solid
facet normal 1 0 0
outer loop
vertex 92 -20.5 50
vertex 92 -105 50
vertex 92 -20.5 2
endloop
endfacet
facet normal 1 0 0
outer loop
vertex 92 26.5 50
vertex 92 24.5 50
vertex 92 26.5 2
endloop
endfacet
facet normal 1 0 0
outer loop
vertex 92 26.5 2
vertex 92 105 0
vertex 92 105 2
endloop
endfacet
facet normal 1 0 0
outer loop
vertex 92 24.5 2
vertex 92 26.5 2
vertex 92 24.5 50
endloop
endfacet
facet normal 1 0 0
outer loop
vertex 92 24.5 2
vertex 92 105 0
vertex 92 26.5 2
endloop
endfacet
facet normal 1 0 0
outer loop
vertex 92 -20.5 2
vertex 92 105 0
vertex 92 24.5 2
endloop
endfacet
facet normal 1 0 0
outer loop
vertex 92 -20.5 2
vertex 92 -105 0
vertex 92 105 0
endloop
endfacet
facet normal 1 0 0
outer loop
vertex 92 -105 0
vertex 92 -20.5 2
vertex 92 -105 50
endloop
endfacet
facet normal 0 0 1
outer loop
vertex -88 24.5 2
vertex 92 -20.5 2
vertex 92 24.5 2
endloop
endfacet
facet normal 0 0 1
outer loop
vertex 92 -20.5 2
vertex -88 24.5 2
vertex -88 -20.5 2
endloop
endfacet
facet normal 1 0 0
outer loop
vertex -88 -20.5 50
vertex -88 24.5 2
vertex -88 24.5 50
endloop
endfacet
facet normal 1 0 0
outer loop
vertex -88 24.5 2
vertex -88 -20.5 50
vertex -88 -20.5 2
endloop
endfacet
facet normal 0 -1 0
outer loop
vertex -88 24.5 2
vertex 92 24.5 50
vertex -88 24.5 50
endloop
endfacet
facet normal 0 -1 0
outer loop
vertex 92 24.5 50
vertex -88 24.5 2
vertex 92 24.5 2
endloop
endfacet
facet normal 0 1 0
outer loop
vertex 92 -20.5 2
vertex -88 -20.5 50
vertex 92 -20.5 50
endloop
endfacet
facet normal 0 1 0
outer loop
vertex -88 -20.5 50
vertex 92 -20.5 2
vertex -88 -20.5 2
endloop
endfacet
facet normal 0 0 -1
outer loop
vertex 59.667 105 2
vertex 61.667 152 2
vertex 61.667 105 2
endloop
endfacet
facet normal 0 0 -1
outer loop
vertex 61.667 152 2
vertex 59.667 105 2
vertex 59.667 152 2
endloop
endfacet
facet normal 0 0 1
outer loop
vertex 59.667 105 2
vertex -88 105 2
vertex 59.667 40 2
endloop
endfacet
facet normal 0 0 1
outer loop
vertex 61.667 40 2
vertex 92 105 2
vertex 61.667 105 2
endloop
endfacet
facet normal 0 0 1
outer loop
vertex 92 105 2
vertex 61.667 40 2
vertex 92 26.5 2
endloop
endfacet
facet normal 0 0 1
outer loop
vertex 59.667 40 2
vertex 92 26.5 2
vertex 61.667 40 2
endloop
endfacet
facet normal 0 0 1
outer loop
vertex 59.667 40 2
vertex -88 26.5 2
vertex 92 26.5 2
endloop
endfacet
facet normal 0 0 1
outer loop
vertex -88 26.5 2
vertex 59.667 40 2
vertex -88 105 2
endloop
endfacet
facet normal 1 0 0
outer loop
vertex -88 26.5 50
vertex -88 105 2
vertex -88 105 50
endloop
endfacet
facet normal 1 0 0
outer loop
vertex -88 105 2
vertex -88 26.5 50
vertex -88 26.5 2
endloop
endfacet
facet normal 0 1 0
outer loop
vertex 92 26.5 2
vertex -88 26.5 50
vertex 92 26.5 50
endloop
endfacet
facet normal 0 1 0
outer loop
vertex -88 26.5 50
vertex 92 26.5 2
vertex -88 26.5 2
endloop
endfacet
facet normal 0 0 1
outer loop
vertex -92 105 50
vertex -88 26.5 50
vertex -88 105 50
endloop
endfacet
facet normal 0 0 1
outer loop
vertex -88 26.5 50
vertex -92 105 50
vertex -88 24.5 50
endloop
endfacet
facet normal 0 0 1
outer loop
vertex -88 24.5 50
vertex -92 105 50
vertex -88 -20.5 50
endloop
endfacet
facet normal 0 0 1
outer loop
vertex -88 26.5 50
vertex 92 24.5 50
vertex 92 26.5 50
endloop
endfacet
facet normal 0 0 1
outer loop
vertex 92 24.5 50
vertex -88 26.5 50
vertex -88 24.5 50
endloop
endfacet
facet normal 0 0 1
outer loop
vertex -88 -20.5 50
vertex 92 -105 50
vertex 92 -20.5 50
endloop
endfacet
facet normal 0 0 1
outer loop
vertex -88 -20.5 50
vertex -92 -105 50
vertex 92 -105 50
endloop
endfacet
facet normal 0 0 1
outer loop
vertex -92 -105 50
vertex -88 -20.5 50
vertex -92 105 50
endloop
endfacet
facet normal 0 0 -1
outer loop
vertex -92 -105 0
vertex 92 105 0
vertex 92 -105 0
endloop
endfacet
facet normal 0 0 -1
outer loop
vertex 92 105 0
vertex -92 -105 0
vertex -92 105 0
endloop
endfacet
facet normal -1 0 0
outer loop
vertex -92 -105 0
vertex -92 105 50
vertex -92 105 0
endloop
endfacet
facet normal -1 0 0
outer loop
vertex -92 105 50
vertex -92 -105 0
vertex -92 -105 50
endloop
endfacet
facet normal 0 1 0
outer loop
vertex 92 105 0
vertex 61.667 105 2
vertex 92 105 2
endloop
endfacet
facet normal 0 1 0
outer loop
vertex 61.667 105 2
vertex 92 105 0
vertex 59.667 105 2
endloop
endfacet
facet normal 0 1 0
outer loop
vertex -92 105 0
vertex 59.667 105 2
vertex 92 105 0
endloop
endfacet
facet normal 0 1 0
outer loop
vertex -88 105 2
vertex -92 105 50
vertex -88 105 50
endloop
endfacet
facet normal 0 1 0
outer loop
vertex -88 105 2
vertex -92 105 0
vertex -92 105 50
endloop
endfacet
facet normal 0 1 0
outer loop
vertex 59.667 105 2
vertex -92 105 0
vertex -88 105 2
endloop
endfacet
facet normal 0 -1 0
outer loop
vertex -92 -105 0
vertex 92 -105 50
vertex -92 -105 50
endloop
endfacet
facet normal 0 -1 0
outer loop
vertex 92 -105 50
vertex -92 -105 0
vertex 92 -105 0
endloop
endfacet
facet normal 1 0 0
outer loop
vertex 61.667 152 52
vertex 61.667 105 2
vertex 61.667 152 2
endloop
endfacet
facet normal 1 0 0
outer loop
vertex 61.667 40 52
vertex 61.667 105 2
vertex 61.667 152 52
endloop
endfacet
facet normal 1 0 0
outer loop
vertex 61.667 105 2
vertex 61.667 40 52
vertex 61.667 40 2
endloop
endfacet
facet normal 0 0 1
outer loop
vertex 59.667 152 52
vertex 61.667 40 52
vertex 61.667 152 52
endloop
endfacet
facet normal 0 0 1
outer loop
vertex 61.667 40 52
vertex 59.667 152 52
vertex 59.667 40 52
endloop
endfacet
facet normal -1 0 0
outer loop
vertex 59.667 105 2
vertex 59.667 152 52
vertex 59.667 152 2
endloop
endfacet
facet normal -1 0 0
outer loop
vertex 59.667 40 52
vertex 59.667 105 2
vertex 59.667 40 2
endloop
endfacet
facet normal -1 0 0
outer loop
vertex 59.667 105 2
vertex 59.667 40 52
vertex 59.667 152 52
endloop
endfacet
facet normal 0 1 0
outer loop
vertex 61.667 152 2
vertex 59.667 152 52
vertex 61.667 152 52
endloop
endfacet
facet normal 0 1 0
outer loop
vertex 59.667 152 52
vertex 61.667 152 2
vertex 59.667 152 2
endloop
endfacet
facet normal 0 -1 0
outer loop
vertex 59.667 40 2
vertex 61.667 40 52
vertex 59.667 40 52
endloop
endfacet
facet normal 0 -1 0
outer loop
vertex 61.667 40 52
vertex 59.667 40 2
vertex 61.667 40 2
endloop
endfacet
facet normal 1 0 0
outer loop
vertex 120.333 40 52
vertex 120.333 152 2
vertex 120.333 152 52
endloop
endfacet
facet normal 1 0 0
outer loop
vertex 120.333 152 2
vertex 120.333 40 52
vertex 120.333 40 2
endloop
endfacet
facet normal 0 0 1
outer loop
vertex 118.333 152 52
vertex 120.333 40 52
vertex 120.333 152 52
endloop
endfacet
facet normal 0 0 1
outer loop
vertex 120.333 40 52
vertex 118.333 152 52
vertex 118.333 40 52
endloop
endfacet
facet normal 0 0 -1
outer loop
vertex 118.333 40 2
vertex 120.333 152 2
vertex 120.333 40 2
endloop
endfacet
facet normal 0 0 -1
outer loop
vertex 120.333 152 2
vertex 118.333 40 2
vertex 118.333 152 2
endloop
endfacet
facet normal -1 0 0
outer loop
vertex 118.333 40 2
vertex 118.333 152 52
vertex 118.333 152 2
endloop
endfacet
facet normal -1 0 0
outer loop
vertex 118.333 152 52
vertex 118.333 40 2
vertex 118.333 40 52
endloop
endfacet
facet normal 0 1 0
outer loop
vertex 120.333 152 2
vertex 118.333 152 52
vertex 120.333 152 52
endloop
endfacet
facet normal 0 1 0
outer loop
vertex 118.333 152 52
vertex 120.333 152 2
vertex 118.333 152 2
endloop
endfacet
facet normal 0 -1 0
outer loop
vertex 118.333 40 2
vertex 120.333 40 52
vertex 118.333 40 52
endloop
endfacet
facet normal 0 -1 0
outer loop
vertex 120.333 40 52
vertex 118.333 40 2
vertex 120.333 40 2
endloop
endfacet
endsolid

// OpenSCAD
// file: BOSL2/std.scad
// Minimal BOSL2 compatibility shim for bundled gallery models.
// It implements only the helpers used by the imported OpenSCAD projects.

CENTER = [0, 0, 0];
BOTTOM = [0, 0, -1];
TOP = [0, 0, 1];
LEFT = [-1, 0, 0];
RIGHT = [1, 0, 0];
FRONT = [0, -1, 0];
BACK = [0, 1, 0];

module up(z=0) {
    translate([0, 0, z]) children();
}

module down(z=0) {
    translate([0, 0, -z]) children();
}

module attach(anchor=CENTER) {
    children();
}

module cuboid(size=[1, 1, 1], anchor=CENTER) {
    center = anchor == CENTER;
    translate(center ? [0, 0, 0] : [0, 0, size[2] / 2])
        cube(size, center=true);
    children();
}

module xcyl(h=1, r=1, anchor=CENTER) {
    center = anchor == CENTER;
    translate(center ? [0, 0, 0] : [h / 2, 0, 0])
        rotate([0, 90, 0])
            cylinder(h=h, r=r, center=true);
}
// main file
//
// This lid rack is intended for the 1c lids to be stored in a sideways orientation in fhe front,
// and larger lids from the 8c and 4c containers to be stored in the back.
//

// The Belfry OpenScad Library, v2:  https://github.com/BelfrySCAD/BOSL2
include <BOSL2/std.scad>

// *** Model Parameters ***
/* [Model Parameters] */

// Overall width of the lid rack
lid_rack_width = 184;

// Overall depth of the lid rack
lid_rack_depth = 210;

// Overall height of the lid rack
lid_rack_height = 50;

// Thickness of the walls between compartments
wall_thickness = 2;

// Small lid cutout depth.  The remaining space will be split into two compartments for the large lids.
small_lid_cutout_depth = 112;

// *** "Private" variables ***
/* [Hidden] */

// Calculated Global Vars
cutout_width = lid_rack_width - (2 * wall_thickness);

// OpenSCAD System Settings
$fa = 1;
$fs = 0.4;

// Keeps the object in positive numbers on the axes; easier for my brain to comprehend when calculating offsets.
BASE_ANCHOR = BOTTOM+FRONT+LEFT;

corner_rounding = 2;

//
// small lid cutout is sideways and in the front.  We want to keep this static, and the remaining
// space broken into two compartments.
//
module small_lid_cutout () {
    x_offset = -((lid_rack_width - cutout_width) / 2) + (wall_thickness * 2);

    
    // Put this in the front of the rack
    y_offset = (lid_rack_depth - small_lid_cutout_depth) - wall_thickness;
    translate([x_offset, y_offset, wall_thickness]) {
        cuboid([cutout_width, small_lid_cutout_depth, lid_rack_height], anchor=BASE_ANCHOR);
    }
}

//
// Create dividers for the small lid cutout separating it into three compartments.
//
module small_lid_cutout_dividers() {
    divider_width = (cutout_width - (2 * wall_thickness)) / 3;

    y_offset = (lid_rack_depth - small_lid_cutout_depth) - wall_thickness;

    for (i = [1, 2]) {
        x_offset = wall_thickness + (divider_width * i);
        translate([x_offset, y_offset, wall_thickness]) {
            color("blue") {
                cuboid([wall_thickness, small_lid_cutout_depth, lid_rack_height], anchor=BASE_ANCHOR);
            }
        }
    }
}

//
// Create two cutouts for the large lids, splitting the space evenly
//
module large_lid_cutouts() {
    remaining_depth = lid_rack_depth - small_lid_cutout_depth - (4 * wall_thickness);
    echo("Remaining Depth: ", remaining_depth);

    small_lid_y = ((lid_rack_depth - small_lid_cutout_depth) / 2) - wall_thickness;
    echo("Small Lid Y Offset: ", small_lid_y);

    // cutout depth
    large_lid_cutout_depth = remaining_depth / 2;
    echo("Large Lid Cutout Depth: ", large_lid_cutout_depth);

    x_offset = wall_thickness;

    for (i = [0, 1]) {
        y_offset = wall_thickness;

        translate ([x_offset, (large_lid_cutout_depth * i) + wall_thickness + (wall_thickness * i), wall_thickness]) {
            color("red") {
                cuboid([cutout_width, large_lid_cutout_depth, lid_rack_height], anchor=BASE_ANCHOR);
            }
        }
     
    }
}

//
// Create the entire glass container lid rack body
//
module glass_container_lid_body() {
    cuboid([lid_rack_width, lid_rack_depth, lid_rack_height], anchor=BASE_ANCHOR, rounding=corner_rounding, 
        except=[BOTTOM]);
}

//
// Builds the entire model
//
module build_model() {
    difference() {
        glass_container_lid_body();

        small_lid_cutout();
        large_lid_cutouts();
    }
    small_lid_cutout_dividers();
}

build_model();
